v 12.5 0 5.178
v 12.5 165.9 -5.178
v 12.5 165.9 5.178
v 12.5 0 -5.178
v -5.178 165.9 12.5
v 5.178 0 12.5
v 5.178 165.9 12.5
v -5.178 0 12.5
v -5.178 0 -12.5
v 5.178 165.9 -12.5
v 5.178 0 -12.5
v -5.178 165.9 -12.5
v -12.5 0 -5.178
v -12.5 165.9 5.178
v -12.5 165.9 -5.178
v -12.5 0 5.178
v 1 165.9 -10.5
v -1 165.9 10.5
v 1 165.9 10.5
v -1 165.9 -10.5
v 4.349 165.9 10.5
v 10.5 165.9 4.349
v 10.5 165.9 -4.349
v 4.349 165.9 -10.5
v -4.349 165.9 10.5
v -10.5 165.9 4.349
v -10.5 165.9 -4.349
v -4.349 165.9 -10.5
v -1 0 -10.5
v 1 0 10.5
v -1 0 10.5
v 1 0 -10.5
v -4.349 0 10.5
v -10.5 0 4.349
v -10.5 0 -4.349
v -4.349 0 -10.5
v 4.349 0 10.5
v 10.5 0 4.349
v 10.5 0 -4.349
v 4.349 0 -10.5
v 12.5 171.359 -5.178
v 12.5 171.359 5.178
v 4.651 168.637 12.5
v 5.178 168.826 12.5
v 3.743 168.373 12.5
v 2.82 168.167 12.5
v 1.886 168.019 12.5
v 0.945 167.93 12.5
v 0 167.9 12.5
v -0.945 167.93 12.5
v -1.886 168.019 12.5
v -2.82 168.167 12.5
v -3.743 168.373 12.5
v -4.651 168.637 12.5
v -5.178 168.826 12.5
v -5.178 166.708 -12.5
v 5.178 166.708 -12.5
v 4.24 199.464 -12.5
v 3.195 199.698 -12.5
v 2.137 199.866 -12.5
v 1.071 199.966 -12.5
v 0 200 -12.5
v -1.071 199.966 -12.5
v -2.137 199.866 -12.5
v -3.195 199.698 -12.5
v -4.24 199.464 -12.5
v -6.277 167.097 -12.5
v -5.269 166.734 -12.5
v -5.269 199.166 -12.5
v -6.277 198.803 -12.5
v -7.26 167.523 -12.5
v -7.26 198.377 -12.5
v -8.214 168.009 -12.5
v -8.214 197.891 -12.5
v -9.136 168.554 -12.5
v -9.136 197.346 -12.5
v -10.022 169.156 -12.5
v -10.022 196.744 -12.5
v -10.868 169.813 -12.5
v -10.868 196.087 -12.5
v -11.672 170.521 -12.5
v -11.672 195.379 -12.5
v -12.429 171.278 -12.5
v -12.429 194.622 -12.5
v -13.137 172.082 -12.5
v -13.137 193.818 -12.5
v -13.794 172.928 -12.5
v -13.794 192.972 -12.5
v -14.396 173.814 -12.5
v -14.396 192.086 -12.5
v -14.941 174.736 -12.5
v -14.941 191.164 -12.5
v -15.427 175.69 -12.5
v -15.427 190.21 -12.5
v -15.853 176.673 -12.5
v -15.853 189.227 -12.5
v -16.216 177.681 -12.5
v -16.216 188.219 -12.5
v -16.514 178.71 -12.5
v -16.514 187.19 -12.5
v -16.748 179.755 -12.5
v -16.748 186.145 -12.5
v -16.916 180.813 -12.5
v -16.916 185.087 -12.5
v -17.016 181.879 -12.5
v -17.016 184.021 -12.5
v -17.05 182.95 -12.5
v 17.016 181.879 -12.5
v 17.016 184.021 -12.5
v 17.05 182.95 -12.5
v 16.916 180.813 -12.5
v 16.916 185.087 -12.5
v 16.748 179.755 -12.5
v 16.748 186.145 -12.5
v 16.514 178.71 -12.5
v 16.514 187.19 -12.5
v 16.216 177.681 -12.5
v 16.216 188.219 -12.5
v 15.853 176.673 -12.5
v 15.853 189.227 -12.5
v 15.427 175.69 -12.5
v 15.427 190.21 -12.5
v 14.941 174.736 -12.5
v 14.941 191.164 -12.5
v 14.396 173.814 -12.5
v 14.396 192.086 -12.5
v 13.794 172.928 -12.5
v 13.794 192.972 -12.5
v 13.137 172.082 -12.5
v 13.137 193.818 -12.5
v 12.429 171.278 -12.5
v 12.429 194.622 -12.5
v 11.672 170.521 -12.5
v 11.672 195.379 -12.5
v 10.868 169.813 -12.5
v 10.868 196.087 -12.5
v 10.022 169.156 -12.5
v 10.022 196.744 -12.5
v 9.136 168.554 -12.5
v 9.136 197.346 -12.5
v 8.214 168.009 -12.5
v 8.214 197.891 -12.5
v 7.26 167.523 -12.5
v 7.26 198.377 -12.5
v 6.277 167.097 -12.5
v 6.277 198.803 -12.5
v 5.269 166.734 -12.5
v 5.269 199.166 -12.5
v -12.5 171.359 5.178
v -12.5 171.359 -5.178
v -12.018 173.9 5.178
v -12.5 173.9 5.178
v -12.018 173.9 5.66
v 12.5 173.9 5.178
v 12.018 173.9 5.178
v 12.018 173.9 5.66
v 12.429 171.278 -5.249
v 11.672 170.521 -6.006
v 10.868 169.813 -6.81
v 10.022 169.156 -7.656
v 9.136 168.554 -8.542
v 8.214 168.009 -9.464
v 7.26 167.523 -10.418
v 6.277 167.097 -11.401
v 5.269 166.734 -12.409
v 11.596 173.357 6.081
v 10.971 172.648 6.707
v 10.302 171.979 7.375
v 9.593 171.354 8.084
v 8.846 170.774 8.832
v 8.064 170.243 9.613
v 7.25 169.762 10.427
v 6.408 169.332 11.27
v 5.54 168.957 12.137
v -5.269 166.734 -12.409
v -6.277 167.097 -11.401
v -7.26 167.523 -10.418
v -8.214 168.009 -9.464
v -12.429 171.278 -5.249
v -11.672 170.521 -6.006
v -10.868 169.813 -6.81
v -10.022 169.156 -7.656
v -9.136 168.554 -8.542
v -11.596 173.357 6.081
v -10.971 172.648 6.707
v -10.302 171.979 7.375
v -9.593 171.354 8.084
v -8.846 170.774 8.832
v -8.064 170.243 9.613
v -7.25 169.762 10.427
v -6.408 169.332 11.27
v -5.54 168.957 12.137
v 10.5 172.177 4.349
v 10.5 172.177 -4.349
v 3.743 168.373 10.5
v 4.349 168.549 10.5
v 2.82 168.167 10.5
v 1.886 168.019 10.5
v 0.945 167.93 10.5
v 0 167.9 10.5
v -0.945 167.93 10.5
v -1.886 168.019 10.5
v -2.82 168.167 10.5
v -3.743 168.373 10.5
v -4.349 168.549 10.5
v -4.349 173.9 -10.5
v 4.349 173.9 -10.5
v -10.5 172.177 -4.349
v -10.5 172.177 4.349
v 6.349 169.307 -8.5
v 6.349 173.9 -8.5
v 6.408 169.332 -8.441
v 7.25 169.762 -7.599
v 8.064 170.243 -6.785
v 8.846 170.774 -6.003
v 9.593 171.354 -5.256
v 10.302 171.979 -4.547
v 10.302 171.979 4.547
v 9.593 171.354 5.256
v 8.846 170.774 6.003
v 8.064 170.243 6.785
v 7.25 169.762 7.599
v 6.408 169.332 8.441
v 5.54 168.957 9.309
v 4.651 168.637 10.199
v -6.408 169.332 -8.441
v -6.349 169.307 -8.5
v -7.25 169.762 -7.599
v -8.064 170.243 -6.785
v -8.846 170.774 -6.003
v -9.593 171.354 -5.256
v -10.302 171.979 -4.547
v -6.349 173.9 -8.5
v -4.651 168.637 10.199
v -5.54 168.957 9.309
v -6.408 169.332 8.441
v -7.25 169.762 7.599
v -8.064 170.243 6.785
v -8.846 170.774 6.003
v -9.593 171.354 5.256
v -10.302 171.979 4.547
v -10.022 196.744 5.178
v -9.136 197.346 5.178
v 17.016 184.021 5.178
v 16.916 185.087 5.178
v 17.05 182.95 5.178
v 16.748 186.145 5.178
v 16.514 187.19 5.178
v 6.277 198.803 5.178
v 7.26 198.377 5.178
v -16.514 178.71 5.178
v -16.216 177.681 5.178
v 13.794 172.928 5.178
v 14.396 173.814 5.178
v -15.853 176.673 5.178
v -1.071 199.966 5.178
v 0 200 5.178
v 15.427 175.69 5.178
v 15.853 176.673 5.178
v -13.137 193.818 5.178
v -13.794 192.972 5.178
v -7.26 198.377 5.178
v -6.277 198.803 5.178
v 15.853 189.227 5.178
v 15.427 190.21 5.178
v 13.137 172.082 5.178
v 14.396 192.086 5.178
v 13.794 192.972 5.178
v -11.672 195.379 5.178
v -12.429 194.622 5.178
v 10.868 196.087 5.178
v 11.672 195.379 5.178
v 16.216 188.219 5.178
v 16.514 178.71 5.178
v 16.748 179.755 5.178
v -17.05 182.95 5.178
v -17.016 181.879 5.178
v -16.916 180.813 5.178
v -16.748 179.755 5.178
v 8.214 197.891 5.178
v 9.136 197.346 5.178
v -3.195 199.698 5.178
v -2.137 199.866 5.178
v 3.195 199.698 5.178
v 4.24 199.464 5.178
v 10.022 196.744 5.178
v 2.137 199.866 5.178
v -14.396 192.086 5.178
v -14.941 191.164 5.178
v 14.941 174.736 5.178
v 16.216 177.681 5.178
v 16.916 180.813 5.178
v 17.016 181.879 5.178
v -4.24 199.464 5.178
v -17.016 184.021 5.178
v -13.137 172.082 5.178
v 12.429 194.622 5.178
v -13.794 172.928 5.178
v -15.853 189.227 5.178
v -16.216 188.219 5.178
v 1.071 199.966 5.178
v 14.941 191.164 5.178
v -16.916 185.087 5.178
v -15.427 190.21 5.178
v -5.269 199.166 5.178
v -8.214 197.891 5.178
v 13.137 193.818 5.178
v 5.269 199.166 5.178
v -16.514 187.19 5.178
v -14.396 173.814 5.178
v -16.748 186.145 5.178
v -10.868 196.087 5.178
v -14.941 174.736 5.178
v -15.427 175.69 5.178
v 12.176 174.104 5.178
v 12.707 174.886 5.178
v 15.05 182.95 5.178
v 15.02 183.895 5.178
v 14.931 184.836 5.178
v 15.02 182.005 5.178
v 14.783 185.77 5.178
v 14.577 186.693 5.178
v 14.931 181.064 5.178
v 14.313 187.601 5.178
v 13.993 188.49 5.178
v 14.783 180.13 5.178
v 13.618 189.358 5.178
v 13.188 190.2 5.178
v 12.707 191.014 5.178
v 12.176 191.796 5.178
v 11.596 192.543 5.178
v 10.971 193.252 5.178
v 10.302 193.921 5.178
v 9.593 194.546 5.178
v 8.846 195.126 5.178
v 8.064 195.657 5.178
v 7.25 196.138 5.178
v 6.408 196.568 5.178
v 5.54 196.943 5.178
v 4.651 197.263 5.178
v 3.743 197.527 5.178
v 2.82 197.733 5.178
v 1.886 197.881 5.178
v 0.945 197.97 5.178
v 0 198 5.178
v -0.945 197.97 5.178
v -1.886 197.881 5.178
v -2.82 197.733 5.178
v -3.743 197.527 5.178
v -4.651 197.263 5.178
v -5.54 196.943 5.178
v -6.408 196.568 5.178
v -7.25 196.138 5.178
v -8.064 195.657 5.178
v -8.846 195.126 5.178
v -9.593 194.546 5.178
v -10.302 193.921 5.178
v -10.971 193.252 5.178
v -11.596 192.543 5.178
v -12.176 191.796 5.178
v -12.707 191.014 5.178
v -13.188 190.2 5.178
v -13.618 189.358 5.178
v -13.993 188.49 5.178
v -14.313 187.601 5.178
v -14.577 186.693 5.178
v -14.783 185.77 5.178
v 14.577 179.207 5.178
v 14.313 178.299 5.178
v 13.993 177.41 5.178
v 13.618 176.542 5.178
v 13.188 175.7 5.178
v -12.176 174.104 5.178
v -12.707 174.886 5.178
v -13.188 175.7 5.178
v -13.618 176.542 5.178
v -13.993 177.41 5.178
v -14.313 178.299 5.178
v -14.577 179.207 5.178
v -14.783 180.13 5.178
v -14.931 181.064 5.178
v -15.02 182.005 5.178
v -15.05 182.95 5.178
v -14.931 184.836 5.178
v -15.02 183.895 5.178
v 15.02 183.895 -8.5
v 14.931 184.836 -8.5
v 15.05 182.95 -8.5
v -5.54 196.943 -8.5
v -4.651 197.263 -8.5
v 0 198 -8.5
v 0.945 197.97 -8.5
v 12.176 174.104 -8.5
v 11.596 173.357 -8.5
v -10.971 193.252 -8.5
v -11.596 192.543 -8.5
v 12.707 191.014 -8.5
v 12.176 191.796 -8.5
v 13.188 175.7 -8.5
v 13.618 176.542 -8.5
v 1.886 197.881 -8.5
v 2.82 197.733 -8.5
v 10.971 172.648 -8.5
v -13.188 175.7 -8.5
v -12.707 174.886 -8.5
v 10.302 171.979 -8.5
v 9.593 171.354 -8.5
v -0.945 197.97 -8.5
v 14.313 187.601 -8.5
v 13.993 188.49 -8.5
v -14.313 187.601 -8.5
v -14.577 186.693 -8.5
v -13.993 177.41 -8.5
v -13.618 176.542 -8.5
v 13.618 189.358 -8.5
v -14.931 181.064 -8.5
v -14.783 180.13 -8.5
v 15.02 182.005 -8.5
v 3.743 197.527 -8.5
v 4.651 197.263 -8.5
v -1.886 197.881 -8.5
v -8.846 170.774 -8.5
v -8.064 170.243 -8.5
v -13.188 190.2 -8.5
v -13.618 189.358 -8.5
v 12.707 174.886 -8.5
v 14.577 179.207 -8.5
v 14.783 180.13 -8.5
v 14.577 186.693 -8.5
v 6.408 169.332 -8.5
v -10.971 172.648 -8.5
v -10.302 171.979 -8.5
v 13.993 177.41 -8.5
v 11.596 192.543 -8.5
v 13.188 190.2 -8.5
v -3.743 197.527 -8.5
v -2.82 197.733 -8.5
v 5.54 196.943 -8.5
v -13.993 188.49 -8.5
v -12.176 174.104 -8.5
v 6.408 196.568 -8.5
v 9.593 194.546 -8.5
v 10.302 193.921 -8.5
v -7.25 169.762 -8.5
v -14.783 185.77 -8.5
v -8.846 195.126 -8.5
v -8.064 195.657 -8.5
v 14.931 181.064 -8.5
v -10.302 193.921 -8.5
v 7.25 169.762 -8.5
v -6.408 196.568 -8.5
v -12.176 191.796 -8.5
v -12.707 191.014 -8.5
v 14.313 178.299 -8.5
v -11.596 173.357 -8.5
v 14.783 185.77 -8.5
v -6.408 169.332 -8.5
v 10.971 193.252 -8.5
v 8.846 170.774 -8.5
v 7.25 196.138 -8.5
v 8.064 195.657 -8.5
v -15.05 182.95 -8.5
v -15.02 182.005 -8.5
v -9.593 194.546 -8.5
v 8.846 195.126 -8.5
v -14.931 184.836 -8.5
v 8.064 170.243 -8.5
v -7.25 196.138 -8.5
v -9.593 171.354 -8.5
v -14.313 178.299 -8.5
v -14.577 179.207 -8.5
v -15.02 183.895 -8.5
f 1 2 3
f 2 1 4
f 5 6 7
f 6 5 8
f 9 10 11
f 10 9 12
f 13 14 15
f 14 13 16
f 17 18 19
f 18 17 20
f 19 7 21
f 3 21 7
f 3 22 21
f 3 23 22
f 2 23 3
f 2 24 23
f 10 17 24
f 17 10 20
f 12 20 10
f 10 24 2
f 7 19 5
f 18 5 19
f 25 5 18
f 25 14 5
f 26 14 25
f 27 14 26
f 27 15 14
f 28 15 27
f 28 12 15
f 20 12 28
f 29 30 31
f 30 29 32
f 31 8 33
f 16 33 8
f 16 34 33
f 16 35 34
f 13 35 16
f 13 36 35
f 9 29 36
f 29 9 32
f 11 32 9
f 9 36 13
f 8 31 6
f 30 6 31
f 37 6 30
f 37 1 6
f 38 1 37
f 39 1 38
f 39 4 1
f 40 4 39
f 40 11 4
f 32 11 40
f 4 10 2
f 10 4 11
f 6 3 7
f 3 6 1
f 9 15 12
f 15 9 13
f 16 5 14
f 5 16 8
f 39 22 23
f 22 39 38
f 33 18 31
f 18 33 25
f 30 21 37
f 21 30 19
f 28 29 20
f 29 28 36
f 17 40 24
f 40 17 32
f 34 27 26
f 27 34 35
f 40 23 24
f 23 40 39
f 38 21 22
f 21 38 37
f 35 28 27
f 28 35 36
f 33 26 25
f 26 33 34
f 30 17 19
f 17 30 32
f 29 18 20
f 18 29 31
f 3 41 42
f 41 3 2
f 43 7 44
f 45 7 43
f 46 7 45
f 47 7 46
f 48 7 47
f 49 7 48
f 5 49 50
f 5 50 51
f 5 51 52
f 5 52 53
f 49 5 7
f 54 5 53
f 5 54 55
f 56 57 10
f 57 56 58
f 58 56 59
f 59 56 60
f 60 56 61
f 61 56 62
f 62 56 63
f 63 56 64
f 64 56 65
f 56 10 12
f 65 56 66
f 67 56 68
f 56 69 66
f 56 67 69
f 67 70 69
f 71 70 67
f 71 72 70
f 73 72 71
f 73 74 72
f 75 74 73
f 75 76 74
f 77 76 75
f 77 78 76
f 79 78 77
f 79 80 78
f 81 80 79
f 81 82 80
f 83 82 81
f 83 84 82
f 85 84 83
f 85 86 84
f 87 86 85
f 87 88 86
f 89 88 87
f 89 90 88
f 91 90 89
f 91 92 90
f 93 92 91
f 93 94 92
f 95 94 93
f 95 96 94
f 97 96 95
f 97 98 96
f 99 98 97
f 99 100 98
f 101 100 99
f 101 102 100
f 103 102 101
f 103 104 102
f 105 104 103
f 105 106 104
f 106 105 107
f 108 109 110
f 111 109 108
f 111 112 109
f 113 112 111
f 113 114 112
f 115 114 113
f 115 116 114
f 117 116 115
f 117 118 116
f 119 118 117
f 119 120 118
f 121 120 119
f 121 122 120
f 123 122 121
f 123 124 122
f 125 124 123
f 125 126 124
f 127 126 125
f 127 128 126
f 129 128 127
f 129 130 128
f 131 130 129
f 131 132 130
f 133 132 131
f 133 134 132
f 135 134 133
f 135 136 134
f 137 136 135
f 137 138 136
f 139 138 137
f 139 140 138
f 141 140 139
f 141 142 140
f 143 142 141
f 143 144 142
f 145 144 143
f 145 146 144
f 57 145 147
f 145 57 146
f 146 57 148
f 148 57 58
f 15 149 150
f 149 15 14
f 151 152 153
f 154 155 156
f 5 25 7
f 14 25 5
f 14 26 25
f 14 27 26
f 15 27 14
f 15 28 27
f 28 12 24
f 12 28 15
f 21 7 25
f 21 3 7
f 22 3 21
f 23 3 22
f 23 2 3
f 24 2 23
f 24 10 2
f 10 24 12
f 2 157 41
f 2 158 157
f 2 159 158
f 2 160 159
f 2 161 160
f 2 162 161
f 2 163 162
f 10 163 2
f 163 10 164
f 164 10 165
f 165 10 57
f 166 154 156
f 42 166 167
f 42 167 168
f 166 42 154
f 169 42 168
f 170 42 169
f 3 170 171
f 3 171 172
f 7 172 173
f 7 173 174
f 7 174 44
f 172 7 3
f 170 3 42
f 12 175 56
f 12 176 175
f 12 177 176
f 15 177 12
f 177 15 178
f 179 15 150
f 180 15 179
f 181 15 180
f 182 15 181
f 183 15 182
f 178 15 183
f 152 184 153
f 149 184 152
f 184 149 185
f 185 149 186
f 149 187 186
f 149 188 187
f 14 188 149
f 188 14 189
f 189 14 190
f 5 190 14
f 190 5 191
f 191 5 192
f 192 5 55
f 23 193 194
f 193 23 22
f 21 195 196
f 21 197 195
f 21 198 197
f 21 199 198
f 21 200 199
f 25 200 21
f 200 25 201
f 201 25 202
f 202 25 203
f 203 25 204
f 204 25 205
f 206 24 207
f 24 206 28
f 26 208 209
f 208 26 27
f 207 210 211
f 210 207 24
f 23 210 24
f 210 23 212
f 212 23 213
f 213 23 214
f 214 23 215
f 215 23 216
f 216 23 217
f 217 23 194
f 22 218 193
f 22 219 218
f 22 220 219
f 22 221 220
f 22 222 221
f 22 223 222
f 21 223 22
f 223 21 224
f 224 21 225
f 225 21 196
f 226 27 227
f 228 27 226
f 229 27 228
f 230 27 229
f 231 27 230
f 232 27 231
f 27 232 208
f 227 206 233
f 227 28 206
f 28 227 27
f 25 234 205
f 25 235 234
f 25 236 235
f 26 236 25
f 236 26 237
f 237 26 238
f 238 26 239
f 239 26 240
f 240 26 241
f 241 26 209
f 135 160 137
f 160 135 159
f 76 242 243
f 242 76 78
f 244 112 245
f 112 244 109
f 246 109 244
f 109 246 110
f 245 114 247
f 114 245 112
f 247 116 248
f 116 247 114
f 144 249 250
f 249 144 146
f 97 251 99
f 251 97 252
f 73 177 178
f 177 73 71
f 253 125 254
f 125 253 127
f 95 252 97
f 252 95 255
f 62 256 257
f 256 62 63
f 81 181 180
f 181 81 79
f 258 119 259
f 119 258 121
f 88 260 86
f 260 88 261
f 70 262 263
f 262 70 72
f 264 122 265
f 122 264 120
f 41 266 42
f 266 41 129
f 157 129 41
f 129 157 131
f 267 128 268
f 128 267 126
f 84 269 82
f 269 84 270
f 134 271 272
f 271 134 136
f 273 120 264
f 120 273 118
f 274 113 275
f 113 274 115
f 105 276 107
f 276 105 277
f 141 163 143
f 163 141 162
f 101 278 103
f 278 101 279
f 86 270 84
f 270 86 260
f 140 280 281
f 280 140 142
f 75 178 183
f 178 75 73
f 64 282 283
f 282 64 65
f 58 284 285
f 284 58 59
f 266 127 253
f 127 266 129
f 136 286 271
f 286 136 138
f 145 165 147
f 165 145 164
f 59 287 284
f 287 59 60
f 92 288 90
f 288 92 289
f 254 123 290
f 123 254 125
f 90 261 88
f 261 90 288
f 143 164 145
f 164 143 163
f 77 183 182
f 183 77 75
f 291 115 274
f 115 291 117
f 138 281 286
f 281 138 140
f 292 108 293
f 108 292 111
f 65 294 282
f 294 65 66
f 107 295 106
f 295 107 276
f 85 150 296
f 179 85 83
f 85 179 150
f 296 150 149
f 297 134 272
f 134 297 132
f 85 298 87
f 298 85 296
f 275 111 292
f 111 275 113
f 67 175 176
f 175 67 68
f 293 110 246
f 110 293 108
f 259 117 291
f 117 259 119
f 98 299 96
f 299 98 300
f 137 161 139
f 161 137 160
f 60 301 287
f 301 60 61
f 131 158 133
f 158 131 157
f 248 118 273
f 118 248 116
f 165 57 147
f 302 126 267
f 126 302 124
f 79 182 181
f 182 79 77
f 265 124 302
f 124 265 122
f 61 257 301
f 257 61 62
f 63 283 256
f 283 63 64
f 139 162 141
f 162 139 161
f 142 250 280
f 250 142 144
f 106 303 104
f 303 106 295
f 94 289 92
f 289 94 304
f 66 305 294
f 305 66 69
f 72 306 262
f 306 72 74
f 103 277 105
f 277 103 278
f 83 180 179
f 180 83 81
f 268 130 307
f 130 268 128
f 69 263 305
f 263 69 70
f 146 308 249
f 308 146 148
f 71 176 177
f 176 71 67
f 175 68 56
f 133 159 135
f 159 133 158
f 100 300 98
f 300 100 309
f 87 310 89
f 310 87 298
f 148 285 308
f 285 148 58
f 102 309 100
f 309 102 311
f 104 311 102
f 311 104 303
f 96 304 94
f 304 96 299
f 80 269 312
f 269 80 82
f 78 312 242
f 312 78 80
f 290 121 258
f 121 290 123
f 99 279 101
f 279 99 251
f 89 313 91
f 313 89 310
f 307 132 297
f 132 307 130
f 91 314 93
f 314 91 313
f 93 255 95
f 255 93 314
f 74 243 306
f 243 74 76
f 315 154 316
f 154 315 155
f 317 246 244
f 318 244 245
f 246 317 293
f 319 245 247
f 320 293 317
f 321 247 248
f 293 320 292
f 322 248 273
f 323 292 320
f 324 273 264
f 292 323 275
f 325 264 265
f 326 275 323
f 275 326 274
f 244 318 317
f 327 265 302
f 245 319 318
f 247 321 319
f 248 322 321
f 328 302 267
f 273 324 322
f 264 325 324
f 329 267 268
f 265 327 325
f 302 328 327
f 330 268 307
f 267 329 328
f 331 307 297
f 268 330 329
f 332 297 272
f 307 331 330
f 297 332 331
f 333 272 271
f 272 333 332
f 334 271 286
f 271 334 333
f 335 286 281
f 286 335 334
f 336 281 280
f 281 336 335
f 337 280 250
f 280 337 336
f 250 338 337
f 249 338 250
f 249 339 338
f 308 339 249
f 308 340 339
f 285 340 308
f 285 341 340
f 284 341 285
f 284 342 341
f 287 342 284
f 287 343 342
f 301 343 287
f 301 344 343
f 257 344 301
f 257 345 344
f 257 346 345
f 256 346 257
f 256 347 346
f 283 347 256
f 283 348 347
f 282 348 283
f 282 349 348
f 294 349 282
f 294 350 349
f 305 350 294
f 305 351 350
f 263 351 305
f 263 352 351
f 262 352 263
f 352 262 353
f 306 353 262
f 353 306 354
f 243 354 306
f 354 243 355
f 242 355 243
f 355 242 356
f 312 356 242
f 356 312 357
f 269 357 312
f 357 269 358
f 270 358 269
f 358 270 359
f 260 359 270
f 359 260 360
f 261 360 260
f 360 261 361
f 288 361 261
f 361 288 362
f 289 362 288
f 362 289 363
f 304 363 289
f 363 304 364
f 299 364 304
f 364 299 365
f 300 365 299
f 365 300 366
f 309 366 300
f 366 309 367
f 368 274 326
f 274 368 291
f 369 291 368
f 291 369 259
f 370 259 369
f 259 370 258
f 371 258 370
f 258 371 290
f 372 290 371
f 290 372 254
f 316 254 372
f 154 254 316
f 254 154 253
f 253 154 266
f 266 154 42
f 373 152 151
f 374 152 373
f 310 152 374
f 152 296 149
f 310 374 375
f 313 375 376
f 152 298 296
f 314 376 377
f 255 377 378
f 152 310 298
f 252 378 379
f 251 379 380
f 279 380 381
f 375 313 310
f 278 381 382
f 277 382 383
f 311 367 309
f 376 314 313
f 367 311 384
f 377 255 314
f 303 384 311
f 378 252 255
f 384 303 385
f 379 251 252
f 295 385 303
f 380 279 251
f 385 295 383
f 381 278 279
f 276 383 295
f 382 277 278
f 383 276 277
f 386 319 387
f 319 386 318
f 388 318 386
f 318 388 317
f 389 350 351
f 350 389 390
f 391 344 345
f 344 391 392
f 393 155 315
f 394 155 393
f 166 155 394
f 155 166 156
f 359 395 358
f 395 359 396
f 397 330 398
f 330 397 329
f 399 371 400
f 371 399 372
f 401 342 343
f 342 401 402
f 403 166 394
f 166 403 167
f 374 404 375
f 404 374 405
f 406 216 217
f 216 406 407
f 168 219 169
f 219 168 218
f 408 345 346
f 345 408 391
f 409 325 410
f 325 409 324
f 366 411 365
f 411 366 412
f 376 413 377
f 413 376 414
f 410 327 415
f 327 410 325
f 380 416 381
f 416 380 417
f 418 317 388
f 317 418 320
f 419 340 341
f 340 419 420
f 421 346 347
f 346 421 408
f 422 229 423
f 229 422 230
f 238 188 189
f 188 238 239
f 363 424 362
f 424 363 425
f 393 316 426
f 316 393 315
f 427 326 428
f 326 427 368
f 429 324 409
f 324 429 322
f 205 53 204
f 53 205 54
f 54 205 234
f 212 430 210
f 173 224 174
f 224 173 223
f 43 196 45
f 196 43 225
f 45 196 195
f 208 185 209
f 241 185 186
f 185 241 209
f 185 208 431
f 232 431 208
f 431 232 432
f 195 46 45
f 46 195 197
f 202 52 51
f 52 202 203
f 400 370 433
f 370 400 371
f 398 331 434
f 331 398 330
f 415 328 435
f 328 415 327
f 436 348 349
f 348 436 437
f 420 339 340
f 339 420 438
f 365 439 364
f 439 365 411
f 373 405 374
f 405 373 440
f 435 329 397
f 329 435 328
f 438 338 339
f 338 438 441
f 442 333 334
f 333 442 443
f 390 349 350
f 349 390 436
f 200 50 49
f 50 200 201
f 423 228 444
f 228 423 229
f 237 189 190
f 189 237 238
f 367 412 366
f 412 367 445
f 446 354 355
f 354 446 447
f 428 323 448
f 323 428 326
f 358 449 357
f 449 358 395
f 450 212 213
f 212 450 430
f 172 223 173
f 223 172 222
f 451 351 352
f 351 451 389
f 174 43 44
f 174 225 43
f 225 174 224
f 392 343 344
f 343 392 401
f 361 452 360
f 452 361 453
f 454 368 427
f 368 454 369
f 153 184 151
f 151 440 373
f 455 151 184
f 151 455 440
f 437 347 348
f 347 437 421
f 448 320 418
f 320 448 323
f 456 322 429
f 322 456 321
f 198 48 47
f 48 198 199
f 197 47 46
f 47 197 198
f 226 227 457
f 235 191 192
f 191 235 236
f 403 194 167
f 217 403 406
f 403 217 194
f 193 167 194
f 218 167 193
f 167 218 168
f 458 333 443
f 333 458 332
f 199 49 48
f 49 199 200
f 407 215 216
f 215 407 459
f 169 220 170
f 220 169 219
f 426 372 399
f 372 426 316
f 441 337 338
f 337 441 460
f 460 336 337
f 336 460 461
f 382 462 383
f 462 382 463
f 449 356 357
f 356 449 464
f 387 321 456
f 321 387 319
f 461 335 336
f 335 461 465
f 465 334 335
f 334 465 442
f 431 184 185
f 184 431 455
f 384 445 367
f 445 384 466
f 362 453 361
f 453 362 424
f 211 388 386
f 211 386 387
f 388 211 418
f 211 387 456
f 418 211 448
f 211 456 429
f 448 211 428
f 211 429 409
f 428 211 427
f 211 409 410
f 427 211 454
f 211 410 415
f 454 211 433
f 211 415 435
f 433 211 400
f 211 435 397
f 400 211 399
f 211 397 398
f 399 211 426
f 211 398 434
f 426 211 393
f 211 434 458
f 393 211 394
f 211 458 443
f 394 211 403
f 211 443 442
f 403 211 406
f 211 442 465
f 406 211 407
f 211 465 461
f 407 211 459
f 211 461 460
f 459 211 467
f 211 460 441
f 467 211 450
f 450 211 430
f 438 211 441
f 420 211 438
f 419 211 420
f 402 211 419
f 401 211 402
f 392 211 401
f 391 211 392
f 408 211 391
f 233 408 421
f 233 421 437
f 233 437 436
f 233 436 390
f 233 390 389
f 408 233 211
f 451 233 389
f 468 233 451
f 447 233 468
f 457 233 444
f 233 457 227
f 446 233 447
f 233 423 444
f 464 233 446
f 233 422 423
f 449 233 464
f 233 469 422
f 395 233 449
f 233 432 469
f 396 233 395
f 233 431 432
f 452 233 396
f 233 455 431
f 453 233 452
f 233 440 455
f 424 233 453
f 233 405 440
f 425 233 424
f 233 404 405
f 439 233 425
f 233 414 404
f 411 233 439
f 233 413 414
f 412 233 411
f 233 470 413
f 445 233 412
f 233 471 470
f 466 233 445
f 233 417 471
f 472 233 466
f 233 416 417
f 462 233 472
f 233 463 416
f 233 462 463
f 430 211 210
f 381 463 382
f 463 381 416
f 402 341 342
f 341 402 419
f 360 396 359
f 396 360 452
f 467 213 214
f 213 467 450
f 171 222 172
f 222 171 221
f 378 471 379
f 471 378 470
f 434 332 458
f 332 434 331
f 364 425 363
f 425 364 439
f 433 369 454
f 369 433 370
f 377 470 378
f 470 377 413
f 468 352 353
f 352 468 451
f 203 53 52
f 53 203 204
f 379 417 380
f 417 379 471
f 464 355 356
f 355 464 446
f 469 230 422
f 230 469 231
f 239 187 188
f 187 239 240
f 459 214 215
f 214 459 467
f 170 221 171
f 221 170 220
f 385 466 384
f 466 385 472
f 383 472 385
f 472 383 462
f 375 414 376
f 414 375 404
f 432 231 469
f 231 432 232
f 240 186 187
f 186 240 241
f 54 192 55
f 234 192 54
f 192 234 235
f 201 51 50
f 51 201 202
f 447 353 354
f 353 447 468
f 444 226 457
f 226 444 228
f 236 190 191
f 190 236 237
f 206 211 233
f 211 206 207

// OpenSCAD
arm_odiam = 25; //mm
arm_length = 200; //mm
arm_thickness = 4; //mm
motor_cup_idiam = 30.1; //mm

module arm_shaft_profile(diameter, length) {
    intersection() {
        translate([-diameter/2,0,-diameter/2]) // center on 0,0,0
        cube([diameter,length,diameter]);
        translate([-sqrt(pow(diameter,2)/2),0,0]) // center on 0,0,0
        rotate([0,45,0])
        cube([diameter,length,diameter]);
    }
}

module arm_internal_rib(diameter, length, thickness) {
    translate([-thickness/2,0,-diameter/2]) cube([thickness, length, diameter]);
}

module arm_shaft(odiameter, length, thickness) {
    difference() {
        arm_shaft_profile(odiameter, length);
        translate([0,-0.5,0]) // extend subtractor beyond subtractee's bounds
        arm_shaft_profile(odiameter-thickness, length+1);
    }
    arm_internal_rib(odiameter, length, 2);
}

module motor_cup(idiameter, height, thickness) {
    translate ([0,0,-height/2])
    difference() {
        difference() {
            union() {
                cylinder(h=height/sqrt(2), r=(idiameter+thickness)/2, $fn=100);
                translate([0, -(idiameter+thickness)/2, height/2]) arm_shaft(height, thickness*2, thickness);
            }
            translate([0,0,thickness]) cylinder(h=height, r=idiameter/2, $fn=100);
        }
        translate([0, -(idiameter+thickness)/2, height/2]) arm_shaft_profile(height-thickness, thickness*2);
    }
}

module arm(height, length, motor_cup_idiam, thickness) {
    arm_shaft(height, length-motor_cup_idiam-thickness, thickness);
    translate([0,length-(motor_cup_idiam+thickness)/2,0]) motor_cup(motor_cup_idiam, height, thickness);
}

arm(arm_odiam, arm_length, motor_cup_idiam, arm_thickness);
